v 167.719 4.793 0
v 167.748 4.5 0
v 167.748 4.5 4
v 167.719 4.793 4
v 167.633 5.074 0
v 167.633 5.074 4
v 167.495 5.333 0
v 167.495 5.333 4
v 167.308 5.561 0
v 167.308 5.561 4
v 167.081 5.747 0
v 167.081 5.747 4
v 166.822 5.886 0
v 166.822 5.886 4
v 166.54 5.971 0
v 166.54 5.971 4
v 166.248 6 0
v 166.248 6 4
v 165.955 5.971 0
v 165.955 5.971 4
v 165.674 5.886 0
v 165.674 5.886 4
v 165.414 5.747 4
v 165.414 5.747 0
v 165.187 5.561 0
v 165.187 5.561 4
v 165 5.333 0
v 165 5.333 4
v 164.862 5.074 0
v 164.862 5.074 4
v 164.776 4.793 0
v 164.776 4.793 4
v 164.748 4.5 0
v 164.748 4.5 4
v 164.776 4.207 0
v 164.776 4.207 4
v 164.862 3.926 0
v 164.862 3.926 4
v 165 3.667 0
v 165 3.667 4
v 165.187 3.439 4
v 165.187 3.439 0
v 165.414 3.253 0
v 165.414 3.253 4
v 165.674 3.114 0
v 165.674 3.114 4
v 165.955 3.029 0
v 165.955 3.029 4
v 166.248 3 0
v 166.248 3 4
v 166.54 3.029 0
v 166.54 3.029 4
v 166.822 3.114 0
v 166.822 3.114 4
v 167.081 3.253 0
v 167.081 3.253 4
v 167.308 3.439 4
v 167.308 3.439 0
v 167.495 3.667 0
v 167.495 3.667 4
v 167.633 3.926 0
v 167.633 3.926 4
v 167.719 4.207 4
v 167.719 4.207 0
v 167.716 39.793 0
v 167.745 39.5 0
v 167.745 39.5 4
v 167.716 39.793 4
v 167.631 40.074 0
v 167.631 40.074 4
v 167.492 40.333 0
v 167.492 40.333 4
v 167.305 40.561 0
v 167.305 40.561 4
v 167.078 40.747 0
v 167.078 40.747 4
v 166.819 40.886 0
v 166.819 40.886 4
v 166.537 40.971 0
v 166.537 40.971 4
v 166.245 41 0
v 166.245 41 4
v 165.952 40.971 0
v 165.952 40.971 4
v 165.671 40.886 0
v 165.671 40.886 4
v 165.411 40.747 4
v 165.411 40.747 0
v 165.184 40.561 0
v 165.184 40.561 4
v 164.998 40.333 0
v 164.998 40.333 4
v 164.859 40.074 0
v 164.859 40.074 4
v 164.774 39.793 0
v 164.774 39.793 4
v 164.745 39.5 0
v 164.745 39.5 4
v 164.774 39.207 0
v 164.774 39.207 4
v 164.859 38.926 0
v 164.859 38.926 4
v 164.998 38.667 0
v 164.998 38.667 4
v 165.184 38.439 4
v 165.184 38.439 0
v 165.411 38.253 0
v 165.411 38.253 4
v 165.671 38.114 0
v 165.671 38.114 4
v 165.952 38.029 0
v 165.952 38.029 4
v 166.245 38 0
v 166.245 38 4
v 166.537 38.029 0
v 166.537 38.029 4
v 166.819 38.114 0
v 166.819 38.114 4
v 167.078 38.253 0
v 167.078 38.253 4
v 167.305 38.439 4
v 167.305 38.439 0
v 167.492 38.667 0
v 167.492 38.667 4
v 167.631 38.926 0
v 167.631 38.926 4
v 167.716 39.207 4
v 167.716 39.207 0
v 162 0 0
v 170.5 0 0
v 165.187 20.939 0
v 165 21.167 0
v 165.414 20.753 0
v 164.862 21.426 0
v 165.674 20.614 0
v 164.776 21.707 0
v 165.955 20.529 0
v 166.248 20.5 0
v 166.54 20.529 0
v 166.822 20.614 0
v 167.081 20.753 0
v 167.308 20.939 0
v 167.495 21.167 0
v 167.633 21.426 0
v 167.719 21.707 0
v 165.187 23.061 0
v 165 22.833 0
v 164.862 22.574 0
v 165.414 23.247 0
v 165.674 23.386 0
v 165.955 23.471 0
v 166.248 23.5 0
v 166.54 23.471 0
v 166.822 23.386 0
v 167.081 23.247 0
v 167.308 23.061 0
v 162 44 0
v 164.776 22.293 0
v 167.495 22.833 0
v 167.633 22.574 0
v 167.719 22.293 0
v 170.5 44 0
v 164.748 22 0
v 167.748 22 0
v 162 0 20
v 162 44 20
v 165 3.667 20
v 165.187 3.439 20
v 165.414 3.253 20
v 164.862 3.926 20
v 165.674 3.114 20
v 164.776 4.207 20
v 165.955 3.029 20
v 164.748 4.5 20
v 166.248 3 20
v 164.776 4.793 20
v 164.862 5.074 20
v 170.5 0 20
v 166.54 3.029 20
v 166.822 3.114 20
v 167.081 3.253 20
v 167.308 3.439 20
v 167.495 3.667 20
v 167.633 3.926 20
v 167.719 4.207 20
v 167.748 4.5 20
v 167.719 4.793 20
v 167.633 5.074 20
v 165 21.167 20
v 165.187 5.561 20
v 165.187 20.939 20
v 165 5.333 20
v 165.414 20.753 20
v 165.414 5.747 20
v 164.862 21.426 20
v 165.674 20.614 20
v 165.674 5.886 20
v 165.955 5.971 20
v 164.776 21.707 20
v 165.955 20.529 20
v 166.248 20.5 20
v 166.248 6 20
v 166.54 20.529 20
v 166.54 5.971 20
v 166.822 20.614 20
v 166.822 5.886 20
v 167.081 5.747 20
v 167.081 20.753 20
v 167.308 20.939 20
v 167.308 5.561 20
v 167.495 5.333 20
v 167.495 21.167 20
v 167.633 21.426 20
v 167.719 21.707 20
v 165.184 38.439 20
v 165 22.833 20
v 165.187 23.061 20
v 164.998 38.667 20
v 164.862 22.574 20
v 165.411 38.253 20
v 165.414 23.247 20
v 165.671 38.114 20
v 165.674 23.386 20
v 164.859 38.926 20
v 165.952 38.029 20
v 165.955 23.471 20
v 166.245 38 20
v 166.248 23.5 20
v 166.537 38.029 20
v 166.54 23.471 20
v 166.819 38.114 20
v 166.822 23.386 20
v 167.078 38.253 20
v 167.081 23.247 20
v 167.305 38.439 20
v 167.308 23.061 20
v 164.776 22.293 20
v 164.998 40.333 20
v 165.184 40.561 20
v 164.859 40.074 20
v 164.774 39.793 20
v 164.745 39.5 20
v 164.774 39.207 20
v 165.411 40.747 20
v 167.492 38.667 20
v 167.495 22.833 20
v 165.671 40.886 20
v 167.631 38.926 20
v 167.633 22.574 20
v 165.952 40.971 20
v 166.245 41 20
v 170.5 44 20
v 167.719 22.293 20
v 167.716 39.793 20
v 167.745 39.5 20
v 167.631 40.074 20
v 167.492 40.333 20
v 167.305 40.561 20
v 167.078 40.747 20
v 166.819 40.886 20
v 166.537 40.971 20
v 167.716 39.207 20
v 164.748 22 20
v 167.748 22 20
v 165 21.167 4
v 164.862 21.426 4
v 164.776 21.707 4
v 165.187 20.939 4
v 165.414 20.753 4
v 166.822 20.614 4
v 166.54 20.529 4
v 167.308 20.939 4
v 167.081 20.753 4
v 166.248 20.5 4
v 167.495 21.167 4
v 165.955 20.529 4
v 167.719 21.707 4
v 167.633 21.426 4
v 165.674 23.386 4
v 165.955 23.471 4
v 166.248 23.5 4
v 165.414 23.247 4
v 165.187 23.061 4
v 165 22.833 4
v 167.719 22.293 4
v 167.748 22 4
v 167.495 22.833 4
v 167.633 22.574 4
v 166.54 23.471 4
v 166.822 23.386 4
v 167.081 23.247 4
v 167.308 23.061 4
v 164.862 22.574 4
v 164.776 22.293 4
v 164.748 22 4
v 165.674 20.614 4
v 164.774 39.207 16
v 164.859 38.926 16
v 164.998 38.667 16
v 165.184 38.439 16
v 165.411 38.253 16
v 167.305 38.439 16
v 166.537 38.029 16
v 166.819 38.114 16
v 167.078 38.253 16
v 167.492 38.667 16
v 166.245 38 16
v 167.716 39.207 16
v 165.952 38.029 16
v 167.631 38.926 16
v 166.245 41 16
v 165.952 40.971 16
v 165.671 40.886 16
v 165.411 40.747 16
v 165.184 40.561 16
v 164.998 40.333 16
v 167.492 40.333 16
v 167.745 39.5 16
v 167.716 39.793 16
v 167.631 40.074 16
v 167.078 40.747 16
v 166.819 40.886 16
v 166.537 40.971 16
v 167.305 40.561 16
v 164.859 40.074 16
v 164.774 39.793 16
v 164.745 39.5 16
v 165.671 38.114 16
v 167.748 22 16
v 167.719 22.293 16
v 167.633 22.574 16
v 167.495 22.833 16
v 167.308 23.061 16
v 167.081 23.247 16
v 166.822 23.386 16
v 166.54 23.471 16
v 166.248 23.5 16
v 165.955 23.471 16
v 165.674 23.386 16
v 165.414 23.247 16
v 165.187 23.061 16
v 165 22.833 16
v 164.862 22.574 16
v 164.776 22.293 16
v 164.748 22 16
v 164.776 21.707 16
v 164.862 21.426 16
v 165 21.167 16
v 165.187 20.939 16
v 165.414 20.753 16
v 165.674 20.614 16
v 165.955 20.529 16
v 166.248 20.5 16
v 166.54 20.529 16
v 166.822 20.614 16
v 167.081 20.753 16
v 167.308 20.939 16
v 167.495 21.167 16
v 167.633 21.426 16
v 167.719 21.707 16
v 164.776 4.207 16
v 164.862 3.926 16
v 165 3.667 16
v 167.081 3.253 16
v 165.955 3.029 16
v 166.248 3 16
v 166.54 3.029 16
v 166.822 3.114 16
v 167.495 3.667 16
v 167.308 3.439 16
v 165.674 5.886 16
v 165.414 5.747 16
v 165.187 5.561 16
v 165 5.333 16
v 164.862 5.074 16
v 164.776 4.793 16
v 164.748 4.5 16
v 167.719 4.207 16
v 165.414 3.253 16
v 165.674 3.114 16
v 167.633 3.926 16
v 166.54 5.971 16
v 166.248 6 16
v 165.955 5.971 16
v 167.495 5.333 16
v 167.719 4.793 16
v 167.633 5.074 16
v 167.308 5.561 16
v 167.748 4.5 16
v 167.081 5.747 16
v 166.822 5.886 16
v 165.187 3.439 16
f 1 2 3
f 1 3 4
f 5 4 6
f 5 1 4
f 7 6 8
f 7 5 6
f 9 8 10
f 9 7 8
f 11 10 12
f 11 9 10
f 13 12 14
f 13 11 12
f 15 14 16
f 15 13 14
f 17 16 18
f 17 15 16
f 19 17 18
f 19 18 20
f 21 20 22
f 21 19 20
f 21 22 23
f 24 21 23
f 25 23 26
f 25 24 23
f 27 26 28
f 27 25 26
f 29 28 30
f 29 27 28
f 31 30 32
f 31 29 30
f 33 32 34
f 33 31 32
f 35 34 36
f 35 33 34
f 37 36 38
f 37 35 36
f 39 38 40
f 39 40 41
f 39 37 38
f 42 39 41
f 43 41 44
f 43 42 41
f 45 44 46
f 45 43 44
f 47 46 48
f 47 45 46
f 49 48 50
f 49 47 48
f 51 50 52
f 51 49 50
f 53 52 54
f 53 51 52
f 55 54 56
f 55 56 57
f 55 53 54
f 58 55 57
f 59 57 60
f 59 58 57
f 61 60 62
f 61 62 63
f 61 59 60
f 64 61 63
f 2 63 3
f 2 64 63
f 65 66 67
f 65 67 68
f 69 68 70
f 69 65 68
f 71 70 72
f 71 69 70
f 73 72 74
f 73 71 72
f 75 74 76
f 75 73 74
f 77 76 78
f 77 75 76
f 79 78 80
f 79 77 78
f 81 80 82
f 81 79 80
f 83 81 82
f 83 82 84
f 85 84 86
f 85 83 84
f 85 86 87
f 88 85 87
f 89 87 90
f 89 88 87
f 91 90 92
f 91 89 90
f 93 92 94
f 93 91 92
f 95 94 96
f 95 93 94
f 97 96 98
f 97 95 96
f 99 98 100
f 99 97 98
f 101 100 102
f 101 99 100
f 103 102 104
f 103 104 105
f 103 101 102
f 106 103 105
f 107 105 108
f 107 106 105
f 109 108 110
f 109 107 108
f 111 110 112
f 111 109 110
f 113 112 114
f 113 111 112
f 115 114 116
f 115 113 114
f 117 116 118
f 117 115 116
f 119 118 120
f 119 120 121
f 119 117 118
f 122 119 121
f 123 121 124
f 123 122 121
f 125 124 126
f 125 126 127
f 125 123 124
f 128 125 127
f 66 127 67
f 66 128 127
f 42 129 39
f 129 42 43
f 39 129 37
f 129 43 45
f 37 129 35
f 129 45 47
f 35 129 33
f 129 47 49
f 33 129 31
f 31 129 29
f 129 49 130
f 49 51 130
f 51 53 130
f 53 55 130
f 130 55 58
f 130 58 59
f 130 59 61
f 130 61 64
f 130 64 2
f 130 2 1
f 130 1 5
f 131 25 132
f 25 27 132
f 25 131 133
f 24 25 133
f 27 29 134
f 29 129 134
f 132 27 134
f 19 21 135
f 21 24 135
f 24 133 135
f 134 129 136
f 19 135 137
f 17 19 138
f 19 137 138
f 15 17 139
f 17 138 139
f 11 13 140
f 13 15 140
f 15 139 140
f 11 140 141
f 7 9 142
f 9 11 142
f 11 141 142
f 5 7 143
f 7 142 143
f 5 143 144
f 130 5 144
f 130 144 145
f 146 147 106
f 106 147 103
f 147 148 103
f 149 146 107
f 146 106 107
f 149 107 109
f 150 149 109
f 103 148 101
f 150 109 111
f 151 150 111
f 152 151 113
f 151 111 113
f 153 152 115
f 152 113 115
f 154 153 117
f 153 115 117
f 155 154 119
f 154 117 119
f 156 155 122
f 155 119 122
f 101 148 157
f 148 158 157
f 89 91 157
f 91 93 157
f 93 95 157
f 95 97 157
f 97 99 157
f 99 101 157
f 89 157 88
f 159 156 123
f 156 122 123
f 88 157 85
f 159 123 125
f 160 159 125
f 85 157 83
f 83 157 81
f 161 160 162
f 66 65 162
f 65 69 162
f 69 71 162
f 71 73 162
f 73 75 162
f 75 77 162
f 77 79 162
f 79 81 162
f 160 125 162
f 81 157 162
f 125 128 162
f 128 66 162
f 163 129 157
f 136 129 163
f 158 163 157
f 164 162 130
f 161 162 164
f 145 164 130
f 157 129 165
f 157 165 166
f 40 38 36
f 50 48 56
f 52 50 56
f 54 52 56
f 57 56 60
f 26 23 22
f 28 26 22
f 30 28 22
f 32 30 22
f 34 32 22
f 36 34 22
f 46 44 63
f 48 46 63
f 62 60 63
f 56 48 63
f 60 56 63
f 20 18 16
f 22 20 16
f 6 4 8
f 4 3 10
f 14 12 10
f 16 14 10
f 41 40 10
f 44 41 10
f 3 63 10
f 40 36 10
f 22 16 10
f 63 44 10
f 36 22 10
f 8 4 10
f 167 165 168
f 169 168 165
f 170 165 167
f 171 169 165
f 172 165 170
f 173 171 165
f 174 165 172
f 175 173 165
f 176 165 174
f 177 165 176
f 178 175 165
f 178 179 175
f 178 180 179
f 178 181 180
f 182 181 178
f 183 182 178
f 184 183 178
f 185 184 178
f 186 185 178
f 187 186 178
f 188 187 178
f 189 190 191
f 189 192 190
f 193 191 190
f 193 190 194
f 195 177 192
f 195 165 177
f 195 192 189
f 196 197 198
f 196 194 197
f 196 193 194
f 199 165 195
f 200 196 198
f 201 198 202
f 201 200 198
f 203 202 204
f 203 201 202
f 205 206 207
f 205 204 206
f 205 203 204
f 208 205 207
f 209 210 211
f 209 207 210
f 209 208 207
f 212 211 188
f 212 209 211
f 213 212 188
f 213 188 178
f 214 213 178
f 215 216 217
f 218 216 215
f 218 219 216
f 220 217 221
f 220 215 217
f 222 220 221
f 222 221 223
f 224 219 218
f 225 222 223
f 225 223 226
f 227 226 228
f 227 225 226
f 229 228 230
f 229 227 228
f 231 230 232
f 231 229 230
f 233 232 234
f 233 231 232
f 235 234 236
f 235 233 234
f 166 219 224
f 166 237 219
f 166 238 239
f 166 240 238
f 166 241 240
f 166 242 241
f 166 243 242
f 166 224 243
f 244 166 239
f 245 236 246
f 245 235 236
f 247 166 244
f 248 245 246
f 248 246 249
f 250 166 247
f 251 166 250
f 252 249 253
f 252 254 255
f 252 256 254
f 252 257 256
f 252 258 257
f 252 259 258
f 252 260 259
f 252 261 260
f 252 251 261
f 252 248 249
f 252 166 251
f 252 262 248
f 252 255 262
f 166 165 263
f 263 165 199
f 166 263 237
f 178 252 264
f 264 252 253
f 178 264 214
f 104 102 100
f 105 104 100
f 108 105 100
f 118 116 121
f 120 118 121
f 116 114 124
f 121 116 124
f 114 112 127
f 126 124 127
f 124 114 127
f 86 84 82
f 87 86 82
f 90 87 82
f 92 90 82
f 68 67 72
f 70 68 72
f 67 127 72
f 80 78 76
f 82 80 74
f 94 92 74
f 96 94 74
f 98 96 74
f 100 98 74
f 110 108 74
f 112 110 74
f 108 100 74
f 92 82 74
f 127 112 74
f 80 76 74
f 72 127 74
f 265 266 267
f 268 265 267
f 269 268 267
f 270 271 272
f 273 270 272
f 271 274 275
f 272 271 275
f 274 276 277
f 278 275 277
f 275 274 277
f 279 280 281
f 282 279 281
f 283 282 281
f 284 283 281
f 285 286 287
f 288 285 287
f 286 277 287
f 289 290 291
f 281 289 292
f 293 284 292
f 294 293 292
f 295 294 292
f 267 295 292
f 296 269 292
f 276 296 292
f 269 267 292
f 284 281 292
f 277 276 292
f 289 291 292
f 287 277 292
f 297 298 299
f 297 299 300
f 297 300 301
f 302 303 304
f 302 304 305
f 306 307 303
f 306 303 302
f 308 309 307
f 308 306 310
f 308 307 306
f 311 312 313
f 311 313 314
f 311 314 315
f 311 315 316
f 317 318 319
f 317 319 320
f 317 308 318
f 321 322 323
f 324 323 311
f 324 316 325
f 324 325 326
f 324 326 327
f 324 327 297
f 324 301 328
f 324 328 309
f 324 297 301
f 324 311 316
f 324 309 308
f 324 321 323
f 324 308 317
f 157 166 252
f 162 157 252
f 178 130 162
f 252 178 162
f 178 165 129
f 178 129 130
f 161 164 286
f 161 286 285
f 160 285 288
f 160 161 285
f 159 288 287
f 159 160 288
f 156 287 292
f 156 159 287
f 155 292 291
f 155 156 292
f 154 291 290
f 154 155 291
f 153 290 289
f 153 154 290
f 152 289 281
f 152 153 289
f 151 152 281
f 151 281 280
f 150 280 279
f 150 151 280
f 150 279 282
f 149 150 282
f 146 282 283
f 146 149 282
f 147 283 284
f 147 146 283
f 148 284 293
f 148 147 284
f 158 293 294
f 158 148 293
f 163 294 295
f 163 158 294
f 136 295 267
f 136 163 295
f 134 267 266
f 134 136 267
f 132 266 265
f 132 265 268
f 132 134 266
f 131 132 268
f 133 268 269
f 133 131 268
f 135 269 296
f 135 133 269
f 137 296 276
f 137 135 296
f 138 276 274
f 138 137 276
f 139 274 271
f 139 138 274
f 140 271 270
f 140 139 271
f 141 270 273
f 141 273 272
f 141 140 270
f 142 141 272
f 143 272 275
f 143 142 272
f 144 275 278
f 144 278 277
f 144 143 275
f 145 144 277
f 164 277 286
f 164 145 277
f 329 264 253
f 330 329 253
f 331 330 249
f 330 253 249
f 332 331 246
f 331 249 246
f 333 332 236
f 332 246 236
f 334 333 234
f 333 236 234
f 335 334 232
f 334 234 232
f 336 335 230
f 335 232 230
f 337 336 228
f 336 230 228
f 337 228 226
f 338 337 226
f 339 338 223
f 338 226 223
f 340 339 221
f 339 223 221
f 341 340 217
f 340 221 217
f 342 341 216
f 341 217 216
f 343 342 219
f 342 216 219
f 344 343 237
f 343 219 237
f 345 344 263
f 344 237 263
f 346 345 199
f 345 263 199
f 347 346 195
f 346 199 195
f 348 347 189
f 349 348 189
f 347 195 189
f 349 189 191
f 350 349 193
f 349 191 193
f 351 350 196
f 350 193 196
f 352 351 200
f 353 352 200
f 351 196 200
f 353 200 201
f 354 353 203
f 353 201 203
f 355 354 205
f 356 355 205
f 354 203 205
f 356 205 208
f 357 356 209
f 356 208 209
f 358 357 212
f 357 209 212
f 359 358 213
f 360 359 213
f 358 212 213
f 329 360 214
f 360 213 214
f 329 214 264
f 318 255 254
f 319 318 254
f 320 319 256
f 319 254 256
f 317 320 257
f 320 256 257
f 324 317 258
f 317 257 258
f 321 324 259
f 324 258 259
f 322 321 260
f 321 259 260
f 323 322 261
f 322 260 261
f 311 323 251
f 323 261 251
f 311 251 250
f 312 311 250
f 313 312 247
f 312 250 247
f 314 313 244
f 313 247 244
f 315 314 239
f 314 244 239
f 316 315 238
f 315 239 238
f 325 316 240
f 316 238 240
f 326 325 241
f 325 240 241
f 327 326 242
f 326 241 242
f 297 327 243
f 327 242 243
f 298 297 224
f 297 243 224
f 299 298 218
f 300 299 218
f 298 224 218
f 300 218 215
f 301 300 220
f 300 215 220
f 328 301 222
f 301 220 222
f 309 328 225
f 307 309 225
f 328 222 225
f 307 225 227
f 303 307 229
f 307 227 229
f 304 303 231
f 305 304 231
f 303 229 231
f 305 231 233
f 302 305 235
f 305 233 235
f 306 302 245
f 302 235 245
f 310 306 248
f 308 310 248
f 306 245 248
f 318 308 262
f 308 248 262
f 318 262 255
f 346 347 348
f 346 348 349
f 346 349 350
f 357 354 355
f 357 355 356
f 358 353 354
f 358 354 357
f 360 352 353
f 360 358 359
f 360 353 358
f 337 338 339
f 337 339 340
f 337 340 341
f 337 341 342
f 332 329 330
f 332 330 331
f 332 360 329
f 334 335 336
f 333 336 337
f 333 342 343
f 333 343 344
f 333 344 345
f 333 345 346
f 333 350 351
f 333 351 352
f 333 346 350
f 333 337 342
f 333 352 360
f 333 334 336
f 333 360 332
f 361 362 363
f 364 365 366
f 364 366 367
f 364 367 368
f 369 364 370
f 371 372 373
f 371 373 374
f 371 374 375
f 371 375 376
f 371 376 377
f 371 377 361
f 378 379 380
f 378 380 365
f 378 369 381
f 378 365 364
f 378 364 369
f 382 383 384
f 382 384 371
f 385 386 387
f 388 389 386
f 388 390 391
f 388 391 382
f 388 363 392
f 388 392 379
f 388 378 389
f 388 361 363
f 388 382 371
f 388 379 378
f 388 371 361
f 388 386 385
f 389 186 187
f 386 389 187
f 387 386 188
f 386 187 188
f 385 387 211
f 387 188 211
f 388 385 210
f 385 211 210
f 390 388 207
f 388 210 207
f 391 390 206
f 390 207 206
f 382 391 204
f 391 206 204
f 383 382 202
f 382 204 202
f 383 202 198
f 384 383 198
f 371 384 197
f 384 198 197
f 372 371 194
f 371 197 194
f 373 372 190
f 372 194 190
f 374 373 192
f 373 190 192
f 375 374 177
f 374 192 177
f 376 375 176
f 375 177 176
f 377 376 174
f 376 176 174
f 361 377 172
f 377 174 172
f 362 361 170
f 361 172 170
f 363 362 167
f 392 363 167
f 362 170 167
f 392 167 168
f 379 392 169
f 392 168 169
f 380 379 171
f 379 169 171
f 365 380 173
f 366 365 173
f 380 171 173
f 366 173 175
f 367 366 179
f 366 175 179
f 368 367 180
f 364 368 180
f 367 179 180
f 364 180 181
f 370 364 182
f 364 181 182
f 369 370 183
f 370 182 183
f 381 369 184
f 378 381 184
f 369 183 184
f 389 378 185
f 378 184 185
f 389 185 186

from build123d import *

# Parameters (mm, degrees)
SKETCH017_W   = 8.5
SKETCH017_H   = 44
PAD001_DEPTH  = 20
SKETCH016_R   = 1.5
HOLE001_DEPTH = 4
SKETCH019_R   = 1.5
HOLE003_DEPTH = 4


with BuildPart() as part:
    # Sketch017 → Pad001 (new body)
    with BuildSketch(Plane.XY):
        with Locations((166.25, 22)):
            Rectangle(SKETCH017_W, SKETCH017_H)
    extrude(amount=PAD001_DEPTH)

    # Sketch016 → Hole001 (cut)
    with BuildSketch(Plane.XY):
        with Locations((166.244797, 39.500001)):
            Circle(SKETCH016_R)
        with Locations((166.247574, 22)):
            Circle(SKETCH016_R)
        with Locations((166.247574, 4.5)):
            Circle(SKETCH016_R)
    extrude(amount=HOLE001_DEPTH, mode=Mode.SUBTRACT)

    # Sketch019 (on Face5 of Hole001) → Hole003 (cut)
    with BuildSketch(Plane.XY.offset(20)):
        with Locations((166.244797, 39.500001)):
            Circle(SKETCH019_R)
        with Locations((166.247574, 22)):
            Circle(SKETCH019_R)
        with Locations((166.247574, 4.5)):
            Circle(SKETCH019_R)
    extrude(amount=-HOLE003_DEPTH, mode=Mode.SUBTRACT)


solid = part.part
